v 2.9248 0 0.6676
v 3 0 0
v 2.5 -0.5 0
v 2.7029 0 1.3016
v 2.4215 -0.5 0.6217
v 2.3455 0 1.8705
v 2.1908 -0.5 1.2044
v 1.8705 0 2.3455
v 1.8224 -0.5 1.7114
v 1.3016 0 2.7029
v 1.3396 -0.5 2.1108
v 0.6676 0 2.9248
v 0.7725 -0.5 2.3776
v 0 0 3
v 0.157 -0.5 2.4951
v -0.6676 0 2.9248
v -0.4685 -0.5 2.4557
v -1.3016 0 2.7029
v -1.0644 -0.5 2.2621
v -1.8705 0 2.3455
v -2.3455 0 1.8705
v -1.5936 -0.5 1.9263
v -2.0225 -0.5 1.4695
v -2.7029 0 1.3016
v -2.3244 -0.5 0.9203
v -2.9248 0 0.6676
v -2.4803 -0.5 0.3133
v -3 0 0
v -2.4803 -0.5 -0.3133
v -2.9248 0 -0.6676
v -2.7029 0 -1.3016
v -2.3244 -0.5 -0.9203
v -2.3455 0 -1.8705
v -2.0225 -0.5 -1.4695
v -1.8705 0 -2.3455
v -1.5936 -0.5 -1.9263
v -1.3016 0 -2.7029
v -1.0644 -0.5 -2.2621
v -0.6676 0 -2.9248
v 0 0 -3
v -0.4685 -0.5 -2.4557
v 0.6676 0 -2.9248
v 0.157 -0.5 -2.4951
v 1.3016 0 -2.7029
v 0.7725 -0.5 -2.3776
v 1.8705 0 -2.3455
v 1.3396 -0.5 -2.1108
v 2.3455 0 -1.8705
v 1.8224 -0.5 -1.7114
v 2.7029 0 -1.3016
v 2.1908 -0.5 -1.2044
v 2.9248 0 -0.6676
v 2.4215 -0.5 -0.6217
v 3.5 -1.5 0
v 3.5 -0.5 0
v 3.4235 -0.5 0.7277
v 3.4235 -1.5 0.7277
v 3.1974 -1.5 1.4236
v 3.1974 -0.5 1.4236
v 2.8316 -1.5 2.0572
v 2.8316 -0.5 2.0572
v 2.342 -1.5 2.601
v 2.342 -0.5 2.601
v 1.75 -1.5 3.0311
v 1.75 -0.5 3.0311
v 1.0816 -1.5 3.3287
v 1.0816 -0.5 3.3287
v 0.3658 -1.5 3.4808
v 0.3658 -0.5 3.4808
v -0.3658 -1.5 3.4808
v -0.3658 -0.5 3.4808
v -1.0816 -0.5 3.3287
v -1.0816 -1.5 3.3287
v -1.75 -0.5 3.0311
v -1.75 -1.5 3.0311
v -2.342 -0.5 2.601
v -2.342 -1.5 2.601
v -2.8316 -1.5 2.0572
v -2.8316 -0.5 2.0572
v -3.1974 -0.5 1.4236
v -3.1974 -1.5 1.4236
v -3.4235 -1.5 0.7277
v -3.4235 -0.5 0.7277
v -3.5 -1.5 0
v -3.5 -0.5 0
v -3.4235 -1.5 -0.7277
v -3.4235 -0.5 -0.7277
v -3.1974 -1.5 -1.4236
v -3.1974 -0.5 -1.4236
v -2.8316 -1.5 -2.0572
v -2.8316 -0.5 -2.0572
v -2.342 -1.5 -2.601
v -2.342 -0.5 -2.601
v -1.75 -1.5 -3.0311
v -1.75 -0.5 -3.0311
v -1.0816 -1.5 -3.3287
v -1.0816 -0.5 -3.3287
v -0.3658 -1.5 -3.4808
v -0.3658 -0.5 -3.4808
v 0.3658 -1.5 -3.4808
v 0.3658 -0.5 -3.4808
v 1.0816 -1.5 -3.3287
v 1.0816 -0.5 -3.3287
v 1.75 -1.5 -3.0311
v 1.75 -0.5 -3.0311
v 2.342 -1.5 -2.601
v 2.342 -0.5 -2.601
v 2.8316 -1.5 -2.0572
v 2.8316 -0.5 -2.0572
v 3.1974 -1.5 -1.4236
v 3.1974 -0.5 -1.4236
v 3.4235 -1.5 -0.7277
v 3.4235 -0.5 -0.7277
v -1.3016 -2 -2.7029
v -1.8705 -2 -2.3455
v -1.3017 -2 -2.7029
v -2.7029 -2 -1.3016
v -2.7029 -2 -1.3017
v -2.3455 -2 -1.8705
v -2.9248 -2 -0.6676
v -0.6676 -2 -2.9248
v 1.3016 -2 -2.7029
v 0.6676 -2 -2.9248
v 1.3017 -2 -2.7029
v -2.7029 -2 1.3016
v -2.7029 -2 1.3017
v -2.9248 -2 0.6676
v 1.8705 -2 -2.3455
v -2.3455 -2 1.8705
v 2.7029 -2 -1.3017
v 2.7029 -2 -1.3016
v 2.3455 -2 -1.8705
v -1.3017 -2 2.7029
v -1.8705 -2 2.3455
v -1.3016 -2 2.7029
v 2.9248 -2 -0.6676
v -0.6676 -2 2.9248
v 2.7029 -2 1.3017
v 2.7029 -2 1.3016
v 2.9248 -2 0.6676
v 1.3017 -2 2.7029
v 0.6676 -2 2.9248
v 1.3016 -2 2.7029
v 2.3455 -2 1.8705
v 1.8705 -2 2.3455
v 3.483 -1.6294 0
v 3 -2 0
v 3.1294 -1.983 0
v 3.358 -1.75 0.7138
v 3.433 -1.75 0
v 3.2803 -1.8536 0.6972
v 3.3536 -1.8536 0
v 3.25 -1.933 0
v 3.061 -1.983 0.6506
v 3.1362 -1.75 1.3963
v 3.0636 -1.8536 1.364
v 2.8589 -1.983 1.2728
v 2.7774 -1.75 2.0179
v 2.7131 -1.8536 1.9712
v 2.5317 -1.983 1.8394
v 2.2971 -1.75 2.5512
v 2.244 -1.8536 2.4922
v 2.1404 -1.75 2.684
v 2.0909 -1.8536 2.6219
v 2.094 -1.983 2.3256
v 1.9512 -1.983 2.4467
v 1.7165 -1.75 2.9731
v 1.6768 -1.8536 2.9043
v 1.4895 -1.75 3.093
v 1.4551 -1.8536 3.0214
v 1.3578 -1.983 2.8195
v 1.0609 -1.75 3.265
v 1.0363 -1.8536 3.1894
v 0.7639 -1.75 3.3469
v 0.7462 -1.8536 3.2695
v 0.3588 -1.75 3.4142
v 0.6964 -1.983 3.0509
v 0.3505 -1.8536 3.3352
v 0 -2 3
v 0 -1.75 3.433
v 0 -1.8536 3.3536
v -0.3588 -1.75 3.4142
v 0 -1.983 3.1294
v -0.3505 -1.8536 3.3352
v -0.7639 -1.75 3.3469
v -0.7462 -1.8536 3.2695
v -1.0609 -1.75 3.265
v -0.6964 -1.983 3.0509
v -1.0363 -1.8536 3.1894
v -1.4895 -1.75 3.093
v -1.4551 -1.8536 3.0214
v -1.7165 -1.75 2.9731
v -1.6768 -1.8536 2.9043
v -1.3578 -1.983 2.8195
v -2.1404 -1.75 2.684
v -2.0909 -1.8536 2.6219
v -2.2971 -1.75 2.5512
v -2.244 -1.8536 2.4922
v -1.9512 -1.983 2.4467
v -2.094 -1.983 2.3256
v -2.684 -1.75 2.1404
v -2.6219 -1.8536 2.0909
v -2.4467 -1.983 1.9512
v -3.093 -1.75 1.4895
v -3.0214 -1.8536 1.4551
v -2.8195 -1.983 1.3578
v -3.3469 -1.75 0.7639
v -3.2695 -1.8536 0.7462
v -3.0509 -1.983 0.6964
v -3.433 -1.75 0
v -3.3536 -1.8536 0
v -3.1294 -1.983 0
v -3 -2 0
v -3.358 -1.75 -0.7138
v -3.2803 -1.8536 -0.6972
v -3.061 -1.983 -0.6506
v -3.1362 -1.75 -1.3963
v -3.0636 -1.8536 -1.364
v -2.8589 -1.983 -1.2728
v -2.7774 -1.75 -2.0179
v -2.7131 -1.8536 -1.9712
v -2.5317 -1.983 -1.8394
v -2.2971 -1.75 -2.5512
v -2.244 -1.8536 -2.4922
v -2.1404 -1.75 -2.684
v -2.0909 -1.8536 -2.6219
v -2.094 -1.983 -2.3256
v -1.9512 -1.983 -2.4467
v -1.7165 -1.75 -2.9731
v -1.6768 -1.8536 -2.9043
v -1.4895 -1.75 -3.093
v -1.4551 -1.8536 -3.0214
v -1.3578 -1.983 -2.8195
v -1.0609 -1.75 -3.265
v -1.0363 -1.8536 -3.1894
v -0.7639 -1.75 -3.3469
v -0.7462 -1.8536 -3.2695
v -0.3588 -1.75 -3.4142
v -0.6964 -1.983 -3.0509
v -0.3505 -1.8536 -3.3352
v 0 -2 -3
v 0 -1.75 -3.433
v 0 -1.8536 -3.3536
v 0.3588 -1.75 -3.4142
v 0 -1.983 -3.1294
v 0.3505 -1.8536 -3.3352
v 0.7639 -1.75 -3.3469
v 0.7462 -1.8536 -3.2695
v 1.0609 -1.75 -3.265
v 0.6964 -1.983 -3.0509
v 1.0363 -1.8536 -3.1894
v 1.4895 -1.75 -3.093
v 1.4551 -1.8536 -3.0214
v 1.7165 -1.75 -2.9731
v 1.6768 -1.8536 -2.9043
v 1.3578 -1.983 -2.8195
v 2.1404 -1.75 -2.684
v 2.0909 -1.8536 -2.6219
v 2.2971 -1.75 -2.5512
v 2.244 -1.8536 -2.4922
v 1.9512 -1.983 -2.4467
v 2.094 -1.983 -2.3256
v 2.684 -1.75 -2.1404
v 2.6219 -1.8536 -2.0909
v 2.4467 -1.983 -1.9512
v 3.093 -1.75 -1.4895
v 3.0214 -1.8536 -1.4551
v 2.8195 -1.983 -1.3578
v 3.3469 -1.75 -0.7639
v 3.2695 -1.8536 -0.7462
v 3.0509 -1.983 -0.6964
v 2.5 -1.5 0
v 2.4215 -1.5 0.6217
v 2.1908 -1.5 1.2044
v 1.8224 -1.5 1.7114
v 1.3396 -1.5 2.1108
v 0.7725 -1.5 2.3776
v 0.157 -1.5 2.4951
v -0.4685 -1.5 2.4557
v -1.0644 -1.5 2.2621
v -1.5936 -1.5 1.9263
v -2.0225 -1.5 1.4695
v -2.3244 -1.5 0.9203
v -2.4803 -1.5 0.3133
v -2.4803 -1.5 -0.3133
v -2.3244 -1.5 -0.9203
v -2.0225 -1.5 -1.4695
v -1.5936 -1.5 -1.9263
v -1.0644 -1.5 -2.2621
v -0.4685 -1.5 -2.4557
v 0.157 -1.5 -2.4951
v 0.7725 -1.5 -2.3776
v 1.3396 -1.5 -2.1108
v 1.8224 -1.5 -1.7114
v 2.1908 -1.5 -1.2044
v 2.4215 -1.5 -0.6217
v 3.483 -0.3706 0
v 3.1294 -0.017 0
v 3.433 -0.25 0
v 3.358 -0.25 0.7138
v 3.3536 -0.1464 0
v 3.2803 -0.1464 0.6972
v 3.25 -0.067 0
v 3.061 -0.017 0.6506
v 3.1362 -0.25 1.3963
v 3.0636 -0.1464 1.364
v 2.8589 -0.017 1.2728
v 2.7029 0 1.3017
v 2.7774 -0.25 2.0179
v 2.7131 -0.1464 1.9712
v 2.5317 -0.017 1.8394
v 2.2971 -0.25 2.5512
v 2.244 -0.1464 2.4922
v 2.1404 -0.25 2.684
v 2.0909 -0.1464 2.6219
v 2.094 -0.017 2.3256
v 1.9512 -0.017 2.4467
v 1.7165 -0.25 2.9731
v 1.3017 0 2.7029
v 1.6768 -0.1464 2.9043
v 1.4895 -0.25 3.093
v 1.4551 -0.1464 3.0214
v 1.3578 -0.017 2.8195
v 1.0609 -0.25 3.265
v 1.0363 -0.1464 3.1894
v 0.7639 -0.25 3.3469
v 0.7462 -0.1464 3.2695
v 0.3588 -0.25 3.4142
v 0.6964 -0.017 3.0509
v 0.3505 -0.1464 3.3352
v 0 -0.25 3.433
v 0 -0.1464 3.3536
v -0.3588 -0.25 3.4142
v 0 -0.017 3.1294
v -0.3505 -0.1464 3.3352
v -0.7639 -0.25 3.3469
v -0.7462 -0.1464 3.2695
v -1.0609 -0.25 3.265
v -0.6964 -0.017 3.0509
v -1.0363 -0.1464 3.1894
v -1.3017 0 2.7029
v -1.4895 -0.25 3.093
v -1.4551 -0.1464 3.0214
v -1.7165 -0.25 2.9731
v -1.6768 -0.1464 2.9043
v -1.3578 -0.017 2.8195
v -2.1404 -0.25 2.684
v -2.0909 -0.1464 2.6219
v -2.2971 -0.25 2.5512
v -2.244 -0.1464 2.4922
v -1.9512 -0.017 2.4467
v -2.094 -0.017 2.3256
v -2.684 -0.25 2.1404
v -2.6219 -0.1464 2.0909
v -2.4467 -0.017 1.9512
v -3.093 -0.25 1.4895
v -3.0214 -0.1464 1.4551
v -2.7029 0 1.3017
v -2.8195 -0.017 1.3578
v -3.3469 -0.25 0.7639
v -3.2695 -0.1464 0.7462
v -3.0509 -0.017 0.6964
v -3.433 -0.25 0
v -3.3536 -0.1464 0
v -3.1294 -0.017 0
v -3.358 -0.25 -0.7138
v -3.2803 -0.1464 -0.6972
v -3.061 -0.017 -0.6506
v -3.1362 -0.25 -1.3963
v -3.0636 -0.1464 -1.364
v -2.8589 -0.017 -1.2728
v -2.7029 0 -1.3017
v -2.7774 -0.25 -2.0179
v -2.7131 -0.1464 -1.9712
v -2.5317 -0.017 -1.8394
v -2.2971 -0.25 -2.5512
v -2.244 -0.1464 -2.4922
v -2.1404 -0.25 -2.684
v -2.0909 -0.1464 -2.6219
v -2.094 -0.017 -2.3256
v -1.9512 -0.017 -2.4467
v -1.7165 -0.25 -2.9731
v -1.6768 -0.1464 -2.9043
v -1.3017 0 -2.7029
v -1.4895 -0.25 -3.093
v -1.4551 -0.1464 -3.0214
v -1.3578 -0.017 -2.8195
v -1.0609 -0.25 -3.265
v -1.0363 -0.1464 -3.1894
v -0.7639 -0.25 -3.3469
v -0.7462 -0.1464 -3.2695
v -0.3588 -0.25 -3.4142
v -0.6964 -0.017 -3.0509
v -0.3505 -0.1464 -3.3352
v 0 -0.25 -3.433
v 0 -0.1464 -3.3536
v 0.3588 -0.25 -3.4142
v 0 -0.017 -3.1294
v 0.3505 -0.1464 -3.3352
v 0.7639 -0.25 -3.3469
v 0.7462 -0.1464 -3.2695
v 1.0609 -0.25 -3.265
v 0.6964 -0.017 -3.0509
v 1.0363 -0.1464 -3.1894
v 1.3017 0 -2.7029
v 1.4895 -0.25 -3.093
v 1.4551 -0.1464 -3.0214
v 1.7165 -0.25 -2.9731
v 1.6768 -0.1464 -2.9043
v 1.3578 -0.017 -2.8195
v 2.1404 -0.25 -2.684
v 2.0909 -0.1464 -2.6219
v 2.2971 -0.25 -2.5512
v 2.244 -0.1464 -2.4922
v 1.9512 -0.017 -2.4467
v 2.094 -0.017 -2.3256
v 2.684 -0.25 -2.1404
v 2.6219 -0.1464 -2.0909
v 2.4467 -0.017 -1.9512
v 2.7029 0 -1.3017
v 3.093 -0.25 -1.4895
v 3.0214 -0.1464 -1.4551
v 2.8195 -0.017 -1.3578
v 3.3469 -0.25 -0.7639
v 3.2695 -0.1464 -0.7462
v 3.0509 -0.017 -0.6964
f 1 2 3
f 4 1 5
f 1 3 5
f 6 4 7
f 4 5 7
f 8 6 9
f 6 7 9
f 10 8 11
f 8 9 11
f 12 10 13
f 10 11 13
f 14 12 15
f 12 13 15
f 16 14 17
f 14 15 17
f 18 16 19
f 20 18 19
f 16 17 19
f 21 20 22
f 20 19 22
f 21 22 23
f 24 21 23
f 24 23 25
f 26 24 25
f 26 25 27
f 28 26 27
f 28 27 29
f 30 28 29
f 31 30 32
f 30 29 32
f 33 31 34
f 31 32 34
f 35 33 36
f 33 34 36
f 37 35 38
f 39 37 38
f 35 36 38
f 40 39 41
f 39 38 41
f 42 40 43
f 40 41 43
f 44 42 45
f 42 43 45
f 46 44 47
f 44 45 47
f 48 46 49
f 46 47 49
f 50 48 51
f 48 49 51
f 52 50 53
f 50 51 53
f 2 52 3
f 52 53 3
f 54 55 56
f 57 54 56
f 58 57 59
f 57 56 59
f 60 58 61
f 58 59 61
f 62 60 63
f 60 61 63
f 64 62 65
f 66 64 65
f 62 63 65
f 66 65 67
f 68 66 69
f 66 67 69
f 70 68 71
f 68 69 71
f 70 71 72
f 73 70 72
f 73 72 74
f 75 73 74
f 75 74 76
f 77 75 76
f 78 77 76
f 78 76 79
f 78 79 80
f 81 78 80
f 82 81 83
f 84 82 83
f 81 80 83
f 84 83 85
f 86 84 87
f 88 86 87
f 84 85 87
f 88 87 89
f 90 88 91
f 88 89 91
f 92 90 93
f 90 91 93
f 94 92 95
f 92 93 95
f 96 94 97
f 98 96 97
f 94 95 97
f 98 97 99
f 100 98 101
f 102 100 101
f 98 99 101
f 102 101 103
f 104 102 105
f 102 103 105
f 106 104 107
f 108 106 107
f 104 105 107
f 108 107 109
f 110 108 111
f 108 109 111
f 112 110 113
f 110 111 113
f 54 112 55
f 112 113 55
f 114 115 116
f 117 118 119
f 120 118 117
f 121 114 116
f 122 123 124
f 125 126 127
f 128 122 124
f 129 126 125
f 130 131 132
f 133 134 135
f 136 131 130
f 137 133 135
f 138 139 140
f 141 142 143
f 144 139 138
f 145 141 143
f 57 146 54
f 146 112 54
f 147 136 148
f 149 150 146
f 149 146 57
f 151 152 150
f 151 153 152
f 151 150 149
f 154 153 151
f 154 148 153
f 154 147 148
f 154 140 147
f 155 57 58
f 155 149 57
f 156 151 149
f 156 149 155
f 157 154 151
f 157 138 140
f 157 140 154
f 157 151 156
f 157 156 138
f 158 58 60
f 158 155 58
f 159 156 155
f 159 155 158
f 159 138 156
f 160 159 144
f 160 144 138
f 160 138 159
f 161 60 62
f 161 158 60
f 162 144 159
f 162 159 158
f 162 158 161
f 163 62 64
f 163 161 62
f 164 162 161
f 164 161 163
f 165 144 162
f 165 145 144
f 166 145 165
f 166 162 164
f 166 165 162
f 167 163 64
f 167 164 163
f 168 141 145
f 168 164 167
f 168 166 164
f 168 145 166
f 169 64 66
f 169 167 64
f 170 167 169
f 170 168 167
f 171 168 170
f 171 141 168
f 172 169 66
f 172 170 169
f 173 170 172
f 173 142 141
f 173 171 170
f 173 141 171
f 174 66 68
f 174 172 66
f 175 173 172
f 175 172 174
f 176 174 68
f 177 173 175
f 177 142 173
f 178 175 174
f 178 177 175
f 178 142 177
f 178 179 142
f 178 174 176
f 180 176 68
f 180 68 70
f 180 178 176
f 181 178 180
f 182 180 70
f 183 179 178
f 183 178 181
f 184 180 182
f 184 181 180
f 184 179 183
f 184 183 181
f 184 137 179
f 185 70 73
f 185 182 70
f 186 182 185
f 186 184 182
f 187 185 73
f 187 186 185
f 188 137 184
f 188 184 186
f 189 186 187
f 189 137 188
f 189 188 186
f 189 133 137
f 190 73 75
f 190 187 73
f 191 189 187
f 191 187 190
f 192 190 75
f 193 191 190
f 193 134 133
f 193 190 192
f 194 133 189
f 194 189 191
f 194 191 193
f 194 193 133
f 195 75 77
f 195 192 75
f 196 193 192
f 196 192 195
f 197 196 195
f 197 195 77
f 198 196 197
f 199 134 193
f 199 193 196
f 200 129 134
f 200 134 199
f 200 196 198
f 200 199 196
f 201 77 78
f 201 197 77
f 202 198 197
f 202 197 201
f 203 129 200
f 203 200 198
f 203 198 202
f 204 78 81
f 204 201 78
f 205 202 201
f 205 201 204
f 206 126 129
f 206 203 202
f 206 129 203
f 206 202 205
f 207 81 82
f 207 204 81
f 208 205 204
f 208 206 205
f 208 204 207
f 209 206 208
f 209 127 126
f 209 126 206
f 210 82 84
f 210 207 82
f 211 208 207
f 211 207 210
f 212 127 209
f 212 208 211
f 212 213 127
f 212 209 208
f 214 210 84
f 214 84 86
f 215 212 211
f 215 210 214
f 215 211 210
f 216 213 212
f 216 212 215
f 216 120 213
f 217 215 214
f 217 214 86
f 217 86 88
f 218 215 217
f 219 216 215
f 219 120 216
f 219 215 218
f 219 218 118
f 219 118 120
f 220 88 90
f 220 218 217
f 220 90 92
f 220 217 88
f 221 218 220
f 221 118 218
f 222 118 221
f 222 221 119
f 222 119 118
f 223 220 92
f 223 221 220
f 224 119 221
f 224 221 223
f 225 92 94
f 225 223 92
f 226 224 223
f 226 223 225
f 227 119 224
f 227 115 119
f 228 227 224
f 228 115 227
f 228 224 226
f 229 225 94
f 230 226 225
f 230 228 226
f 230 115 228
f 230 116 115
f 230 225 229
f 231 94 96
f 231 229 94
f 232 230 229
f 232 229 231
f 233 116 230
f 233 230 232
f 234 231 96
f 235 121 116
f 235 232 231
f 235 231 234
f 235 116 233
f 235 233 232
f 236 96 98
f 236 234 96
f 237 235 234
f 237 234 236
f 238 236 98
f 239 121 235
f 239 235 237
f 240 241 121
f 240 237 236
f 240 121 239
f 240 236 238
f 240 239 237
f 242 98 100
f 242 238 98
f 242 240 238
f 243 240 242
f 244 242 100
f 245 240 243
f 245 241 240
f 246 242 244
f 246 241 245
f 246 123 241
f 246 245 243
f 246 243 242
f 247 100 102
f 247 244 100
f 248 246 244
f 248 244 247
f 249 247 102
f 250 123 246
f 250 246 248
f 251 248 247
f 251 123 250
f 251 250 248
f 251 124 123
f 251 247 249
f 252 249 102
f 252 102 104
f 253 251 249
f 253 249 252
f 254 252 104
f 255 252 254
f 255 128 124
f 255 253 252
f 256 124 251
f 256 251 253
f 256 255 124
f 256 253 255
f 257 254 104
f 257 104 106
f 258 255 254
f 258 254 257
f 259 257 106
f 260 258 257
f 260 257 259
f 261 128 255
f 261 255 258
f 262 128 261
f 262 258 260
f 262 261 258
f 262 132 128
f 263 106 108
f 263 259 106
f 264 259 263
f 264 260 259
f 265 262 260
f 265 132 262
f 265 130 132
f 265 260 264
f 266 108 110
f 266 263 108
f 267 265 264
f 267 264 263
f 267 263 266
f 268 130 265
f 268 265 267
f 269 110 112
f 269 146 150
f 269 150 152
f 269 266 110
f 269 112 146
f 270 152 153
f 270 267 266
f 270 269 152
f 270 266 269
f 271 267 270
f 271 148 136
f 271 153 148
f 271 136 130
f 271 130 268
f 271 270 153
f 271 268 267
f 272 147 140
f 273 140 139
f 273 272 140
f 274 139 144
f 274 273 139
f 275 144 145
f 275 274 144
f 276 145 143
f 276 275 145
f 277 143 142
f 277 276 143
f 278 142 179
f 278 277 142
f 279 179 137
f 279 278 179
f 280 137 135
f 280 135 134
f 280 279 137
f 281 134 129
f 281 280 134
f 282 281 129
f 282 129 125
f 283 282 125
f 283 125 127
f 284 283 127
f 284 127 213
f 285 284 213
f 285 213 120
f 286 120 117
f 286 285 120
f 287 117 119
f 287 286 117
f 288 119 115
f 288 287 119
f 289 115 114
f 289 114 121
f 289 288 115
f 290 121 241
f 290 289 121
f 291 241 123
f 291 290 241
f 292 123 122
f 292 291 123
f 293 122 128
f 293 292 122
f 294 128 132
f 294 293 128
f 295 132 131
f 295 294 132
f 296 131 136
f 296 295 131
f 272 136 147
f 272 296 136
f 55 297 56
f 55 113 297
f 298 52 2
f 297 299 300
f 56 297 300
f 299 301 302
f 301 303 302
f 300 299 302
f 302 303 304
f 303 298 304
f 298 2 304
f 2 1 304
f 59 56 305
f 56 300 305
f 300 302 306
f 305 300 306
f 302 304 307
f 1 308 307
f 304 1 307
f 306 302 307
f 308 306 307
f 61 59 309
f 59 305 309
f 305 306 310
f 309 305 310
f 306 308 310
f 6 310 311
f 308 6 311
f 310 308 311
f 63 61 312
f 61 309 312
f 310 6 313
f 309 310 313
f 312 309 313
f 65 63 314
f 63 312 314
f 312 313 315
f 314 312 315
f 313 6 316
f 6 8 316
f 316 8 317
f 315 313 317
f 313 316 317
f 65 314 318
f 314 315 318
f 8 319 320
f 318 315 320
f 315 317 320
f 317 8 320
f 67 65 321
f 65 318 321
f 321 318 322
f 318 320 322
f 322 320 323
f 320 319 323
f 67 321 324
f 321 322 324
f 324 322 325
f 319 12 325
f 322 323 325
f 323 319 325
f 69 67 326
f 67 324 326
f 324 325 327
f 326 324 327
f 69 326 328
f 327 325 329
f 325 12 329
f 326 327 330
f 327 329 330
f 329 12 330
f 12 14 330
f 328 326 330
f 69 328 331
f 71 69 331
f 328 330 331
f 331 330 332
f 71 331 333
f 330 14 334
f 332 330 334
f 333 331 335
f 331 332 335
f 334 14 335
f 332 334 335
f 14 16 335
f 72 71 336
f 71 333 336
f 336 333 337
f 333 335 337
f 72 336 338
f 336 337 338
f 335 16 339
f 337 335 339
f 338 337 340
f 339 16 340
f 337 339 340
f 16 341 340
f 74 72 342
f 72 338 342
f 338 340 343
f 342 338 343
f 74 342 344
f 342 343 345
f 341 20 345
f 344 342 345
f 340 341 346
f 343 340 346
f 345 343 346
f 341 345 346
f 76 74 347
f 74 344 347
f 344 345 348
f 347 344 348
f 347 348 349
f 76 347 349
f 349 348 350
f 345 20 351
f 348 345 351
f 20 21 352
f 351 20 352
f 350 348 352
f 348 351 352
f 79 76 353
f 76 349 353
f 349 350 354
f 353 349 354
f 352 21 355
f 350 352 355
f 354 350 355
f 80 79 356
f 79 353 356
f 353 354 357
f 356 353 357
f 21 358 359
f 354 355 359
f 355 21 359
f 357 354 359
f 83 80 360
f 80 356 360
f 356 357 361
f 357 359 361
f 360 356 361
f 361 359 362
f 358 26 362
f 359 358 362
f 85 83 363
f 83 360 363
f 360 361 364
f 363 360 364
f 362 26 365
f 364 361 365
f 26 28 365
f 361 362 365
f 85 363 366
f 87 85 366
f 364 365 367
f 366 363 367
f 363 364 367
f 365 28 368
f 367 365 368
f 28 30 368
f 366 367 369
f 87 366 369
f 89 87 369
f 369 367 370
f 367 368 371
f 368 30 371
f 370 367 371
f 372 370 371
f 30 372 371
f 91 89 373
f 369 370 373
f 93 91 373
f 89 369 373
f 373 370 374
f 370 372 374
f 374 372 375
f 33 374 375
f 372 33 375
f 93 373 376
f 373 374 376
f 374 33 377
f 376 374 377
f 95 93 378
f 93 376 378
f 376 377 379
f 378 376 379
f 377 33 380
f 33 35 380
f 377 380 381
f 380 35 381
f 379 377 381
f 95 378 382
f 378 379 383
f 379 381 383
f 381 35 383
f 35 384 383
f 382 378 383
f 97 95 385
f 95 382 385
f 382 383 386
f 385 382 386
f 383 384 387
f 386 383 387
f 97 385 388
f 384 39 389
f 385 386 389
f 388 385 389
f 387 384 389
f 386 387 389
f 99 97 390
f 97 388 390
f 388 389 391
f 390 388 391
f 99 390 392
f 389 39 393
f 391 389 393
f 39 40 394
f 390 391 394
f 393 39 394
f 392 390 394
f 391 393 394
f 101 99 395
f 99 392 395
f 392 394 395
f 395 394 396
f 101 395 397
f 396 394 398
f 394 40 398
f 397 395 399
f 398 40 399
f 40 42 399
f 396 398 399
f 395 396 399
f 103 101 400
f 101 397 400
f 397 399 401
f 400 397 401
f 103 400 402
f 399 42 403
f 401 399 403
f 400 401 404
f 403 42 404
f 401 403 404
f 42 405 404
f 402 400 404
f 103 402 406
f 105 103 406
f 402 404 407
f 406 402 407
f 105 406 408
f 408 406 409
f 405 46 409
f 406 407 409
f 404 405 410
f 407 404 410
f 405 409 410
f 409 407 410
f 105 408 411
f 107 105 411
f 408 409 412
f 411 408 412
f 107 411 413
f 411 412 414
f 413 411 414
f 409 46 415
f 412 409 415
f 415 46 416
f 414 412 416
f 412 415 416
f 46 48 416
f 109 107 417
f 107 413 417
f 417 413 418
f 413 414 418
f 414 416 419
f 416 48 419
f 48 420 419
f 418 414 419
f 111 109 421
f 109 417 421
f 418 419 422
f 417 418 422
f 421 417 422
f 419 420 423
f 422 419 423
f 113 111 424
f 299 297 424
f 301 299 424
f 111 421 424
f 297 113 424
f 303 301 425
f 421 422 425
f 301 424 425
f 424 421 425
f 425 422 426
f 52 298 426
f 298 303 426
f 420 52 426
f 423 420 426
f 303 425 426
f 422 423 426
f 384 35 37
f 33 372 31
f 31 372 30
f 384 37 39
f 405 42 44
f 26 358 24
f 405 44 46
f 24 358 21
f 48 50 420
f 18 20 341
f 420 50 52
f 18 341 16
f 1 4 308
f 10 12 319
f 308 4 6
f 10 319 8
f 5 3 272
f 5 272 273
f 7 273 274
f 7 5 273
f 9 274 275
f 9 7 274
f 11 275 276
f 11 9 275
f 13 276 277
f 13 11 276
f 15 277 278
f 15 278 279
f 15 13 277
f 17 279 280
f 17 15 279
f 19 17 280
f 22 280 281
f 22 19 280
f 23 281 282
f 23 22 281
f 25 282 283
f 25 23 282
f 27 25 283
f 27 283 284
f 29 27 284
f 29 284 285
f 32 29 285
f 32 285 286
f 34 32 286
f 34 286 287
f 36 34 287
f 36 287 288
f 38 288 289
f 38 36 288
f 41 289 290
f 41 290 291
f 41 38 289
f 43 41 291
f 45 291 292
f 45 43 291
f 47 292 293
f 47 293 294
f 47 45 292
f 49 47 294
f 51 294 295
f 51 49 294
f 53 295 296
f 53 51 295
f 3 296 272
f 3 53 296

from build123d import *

# Parameters (mm, degrees)
F0_R     = 3.5
F0_R_2   = 2.5
F1_DEPTH = 2
F2_R     = 0.5
F3_SIZE  = 0.49999


# Not quite as in the source:
# - a fillet or chamfer is up to 0.001 mm smaller than in the source, because OpenCascade refuses the exact size


with BuildPart() as f1:
    # F0 (on Front) → F1 (new body)
    with BuildSketch(Plane.XZ):
        Circle(F0_R)
        Circle(F0_R_2, mode=Mode.SUBTRACT)
    extrude(amount=F1_DEPTH)

    # F2
    f2_edges = [f1.edges().sort_by_distance(p)[0] for p in [
        (-3.5, -2, 0),
        (3.5, -1, 0),
        (-3.5, 0, 0),
    ]]
    fillet(f2_edges, radius=F2_R)

    # F3 (size 0.5 in the source; OpenCascade refuses exactly that, so slightly less here)
    f3_edges = [f1.edges().sort_by_distance(p)[0] for p in [
        (-2.5, -2, 0),
        (-2.5, 0, 0),
    ]]
    chamfer(f3_edges, length=F3_SIZE)


solid = f1.part
